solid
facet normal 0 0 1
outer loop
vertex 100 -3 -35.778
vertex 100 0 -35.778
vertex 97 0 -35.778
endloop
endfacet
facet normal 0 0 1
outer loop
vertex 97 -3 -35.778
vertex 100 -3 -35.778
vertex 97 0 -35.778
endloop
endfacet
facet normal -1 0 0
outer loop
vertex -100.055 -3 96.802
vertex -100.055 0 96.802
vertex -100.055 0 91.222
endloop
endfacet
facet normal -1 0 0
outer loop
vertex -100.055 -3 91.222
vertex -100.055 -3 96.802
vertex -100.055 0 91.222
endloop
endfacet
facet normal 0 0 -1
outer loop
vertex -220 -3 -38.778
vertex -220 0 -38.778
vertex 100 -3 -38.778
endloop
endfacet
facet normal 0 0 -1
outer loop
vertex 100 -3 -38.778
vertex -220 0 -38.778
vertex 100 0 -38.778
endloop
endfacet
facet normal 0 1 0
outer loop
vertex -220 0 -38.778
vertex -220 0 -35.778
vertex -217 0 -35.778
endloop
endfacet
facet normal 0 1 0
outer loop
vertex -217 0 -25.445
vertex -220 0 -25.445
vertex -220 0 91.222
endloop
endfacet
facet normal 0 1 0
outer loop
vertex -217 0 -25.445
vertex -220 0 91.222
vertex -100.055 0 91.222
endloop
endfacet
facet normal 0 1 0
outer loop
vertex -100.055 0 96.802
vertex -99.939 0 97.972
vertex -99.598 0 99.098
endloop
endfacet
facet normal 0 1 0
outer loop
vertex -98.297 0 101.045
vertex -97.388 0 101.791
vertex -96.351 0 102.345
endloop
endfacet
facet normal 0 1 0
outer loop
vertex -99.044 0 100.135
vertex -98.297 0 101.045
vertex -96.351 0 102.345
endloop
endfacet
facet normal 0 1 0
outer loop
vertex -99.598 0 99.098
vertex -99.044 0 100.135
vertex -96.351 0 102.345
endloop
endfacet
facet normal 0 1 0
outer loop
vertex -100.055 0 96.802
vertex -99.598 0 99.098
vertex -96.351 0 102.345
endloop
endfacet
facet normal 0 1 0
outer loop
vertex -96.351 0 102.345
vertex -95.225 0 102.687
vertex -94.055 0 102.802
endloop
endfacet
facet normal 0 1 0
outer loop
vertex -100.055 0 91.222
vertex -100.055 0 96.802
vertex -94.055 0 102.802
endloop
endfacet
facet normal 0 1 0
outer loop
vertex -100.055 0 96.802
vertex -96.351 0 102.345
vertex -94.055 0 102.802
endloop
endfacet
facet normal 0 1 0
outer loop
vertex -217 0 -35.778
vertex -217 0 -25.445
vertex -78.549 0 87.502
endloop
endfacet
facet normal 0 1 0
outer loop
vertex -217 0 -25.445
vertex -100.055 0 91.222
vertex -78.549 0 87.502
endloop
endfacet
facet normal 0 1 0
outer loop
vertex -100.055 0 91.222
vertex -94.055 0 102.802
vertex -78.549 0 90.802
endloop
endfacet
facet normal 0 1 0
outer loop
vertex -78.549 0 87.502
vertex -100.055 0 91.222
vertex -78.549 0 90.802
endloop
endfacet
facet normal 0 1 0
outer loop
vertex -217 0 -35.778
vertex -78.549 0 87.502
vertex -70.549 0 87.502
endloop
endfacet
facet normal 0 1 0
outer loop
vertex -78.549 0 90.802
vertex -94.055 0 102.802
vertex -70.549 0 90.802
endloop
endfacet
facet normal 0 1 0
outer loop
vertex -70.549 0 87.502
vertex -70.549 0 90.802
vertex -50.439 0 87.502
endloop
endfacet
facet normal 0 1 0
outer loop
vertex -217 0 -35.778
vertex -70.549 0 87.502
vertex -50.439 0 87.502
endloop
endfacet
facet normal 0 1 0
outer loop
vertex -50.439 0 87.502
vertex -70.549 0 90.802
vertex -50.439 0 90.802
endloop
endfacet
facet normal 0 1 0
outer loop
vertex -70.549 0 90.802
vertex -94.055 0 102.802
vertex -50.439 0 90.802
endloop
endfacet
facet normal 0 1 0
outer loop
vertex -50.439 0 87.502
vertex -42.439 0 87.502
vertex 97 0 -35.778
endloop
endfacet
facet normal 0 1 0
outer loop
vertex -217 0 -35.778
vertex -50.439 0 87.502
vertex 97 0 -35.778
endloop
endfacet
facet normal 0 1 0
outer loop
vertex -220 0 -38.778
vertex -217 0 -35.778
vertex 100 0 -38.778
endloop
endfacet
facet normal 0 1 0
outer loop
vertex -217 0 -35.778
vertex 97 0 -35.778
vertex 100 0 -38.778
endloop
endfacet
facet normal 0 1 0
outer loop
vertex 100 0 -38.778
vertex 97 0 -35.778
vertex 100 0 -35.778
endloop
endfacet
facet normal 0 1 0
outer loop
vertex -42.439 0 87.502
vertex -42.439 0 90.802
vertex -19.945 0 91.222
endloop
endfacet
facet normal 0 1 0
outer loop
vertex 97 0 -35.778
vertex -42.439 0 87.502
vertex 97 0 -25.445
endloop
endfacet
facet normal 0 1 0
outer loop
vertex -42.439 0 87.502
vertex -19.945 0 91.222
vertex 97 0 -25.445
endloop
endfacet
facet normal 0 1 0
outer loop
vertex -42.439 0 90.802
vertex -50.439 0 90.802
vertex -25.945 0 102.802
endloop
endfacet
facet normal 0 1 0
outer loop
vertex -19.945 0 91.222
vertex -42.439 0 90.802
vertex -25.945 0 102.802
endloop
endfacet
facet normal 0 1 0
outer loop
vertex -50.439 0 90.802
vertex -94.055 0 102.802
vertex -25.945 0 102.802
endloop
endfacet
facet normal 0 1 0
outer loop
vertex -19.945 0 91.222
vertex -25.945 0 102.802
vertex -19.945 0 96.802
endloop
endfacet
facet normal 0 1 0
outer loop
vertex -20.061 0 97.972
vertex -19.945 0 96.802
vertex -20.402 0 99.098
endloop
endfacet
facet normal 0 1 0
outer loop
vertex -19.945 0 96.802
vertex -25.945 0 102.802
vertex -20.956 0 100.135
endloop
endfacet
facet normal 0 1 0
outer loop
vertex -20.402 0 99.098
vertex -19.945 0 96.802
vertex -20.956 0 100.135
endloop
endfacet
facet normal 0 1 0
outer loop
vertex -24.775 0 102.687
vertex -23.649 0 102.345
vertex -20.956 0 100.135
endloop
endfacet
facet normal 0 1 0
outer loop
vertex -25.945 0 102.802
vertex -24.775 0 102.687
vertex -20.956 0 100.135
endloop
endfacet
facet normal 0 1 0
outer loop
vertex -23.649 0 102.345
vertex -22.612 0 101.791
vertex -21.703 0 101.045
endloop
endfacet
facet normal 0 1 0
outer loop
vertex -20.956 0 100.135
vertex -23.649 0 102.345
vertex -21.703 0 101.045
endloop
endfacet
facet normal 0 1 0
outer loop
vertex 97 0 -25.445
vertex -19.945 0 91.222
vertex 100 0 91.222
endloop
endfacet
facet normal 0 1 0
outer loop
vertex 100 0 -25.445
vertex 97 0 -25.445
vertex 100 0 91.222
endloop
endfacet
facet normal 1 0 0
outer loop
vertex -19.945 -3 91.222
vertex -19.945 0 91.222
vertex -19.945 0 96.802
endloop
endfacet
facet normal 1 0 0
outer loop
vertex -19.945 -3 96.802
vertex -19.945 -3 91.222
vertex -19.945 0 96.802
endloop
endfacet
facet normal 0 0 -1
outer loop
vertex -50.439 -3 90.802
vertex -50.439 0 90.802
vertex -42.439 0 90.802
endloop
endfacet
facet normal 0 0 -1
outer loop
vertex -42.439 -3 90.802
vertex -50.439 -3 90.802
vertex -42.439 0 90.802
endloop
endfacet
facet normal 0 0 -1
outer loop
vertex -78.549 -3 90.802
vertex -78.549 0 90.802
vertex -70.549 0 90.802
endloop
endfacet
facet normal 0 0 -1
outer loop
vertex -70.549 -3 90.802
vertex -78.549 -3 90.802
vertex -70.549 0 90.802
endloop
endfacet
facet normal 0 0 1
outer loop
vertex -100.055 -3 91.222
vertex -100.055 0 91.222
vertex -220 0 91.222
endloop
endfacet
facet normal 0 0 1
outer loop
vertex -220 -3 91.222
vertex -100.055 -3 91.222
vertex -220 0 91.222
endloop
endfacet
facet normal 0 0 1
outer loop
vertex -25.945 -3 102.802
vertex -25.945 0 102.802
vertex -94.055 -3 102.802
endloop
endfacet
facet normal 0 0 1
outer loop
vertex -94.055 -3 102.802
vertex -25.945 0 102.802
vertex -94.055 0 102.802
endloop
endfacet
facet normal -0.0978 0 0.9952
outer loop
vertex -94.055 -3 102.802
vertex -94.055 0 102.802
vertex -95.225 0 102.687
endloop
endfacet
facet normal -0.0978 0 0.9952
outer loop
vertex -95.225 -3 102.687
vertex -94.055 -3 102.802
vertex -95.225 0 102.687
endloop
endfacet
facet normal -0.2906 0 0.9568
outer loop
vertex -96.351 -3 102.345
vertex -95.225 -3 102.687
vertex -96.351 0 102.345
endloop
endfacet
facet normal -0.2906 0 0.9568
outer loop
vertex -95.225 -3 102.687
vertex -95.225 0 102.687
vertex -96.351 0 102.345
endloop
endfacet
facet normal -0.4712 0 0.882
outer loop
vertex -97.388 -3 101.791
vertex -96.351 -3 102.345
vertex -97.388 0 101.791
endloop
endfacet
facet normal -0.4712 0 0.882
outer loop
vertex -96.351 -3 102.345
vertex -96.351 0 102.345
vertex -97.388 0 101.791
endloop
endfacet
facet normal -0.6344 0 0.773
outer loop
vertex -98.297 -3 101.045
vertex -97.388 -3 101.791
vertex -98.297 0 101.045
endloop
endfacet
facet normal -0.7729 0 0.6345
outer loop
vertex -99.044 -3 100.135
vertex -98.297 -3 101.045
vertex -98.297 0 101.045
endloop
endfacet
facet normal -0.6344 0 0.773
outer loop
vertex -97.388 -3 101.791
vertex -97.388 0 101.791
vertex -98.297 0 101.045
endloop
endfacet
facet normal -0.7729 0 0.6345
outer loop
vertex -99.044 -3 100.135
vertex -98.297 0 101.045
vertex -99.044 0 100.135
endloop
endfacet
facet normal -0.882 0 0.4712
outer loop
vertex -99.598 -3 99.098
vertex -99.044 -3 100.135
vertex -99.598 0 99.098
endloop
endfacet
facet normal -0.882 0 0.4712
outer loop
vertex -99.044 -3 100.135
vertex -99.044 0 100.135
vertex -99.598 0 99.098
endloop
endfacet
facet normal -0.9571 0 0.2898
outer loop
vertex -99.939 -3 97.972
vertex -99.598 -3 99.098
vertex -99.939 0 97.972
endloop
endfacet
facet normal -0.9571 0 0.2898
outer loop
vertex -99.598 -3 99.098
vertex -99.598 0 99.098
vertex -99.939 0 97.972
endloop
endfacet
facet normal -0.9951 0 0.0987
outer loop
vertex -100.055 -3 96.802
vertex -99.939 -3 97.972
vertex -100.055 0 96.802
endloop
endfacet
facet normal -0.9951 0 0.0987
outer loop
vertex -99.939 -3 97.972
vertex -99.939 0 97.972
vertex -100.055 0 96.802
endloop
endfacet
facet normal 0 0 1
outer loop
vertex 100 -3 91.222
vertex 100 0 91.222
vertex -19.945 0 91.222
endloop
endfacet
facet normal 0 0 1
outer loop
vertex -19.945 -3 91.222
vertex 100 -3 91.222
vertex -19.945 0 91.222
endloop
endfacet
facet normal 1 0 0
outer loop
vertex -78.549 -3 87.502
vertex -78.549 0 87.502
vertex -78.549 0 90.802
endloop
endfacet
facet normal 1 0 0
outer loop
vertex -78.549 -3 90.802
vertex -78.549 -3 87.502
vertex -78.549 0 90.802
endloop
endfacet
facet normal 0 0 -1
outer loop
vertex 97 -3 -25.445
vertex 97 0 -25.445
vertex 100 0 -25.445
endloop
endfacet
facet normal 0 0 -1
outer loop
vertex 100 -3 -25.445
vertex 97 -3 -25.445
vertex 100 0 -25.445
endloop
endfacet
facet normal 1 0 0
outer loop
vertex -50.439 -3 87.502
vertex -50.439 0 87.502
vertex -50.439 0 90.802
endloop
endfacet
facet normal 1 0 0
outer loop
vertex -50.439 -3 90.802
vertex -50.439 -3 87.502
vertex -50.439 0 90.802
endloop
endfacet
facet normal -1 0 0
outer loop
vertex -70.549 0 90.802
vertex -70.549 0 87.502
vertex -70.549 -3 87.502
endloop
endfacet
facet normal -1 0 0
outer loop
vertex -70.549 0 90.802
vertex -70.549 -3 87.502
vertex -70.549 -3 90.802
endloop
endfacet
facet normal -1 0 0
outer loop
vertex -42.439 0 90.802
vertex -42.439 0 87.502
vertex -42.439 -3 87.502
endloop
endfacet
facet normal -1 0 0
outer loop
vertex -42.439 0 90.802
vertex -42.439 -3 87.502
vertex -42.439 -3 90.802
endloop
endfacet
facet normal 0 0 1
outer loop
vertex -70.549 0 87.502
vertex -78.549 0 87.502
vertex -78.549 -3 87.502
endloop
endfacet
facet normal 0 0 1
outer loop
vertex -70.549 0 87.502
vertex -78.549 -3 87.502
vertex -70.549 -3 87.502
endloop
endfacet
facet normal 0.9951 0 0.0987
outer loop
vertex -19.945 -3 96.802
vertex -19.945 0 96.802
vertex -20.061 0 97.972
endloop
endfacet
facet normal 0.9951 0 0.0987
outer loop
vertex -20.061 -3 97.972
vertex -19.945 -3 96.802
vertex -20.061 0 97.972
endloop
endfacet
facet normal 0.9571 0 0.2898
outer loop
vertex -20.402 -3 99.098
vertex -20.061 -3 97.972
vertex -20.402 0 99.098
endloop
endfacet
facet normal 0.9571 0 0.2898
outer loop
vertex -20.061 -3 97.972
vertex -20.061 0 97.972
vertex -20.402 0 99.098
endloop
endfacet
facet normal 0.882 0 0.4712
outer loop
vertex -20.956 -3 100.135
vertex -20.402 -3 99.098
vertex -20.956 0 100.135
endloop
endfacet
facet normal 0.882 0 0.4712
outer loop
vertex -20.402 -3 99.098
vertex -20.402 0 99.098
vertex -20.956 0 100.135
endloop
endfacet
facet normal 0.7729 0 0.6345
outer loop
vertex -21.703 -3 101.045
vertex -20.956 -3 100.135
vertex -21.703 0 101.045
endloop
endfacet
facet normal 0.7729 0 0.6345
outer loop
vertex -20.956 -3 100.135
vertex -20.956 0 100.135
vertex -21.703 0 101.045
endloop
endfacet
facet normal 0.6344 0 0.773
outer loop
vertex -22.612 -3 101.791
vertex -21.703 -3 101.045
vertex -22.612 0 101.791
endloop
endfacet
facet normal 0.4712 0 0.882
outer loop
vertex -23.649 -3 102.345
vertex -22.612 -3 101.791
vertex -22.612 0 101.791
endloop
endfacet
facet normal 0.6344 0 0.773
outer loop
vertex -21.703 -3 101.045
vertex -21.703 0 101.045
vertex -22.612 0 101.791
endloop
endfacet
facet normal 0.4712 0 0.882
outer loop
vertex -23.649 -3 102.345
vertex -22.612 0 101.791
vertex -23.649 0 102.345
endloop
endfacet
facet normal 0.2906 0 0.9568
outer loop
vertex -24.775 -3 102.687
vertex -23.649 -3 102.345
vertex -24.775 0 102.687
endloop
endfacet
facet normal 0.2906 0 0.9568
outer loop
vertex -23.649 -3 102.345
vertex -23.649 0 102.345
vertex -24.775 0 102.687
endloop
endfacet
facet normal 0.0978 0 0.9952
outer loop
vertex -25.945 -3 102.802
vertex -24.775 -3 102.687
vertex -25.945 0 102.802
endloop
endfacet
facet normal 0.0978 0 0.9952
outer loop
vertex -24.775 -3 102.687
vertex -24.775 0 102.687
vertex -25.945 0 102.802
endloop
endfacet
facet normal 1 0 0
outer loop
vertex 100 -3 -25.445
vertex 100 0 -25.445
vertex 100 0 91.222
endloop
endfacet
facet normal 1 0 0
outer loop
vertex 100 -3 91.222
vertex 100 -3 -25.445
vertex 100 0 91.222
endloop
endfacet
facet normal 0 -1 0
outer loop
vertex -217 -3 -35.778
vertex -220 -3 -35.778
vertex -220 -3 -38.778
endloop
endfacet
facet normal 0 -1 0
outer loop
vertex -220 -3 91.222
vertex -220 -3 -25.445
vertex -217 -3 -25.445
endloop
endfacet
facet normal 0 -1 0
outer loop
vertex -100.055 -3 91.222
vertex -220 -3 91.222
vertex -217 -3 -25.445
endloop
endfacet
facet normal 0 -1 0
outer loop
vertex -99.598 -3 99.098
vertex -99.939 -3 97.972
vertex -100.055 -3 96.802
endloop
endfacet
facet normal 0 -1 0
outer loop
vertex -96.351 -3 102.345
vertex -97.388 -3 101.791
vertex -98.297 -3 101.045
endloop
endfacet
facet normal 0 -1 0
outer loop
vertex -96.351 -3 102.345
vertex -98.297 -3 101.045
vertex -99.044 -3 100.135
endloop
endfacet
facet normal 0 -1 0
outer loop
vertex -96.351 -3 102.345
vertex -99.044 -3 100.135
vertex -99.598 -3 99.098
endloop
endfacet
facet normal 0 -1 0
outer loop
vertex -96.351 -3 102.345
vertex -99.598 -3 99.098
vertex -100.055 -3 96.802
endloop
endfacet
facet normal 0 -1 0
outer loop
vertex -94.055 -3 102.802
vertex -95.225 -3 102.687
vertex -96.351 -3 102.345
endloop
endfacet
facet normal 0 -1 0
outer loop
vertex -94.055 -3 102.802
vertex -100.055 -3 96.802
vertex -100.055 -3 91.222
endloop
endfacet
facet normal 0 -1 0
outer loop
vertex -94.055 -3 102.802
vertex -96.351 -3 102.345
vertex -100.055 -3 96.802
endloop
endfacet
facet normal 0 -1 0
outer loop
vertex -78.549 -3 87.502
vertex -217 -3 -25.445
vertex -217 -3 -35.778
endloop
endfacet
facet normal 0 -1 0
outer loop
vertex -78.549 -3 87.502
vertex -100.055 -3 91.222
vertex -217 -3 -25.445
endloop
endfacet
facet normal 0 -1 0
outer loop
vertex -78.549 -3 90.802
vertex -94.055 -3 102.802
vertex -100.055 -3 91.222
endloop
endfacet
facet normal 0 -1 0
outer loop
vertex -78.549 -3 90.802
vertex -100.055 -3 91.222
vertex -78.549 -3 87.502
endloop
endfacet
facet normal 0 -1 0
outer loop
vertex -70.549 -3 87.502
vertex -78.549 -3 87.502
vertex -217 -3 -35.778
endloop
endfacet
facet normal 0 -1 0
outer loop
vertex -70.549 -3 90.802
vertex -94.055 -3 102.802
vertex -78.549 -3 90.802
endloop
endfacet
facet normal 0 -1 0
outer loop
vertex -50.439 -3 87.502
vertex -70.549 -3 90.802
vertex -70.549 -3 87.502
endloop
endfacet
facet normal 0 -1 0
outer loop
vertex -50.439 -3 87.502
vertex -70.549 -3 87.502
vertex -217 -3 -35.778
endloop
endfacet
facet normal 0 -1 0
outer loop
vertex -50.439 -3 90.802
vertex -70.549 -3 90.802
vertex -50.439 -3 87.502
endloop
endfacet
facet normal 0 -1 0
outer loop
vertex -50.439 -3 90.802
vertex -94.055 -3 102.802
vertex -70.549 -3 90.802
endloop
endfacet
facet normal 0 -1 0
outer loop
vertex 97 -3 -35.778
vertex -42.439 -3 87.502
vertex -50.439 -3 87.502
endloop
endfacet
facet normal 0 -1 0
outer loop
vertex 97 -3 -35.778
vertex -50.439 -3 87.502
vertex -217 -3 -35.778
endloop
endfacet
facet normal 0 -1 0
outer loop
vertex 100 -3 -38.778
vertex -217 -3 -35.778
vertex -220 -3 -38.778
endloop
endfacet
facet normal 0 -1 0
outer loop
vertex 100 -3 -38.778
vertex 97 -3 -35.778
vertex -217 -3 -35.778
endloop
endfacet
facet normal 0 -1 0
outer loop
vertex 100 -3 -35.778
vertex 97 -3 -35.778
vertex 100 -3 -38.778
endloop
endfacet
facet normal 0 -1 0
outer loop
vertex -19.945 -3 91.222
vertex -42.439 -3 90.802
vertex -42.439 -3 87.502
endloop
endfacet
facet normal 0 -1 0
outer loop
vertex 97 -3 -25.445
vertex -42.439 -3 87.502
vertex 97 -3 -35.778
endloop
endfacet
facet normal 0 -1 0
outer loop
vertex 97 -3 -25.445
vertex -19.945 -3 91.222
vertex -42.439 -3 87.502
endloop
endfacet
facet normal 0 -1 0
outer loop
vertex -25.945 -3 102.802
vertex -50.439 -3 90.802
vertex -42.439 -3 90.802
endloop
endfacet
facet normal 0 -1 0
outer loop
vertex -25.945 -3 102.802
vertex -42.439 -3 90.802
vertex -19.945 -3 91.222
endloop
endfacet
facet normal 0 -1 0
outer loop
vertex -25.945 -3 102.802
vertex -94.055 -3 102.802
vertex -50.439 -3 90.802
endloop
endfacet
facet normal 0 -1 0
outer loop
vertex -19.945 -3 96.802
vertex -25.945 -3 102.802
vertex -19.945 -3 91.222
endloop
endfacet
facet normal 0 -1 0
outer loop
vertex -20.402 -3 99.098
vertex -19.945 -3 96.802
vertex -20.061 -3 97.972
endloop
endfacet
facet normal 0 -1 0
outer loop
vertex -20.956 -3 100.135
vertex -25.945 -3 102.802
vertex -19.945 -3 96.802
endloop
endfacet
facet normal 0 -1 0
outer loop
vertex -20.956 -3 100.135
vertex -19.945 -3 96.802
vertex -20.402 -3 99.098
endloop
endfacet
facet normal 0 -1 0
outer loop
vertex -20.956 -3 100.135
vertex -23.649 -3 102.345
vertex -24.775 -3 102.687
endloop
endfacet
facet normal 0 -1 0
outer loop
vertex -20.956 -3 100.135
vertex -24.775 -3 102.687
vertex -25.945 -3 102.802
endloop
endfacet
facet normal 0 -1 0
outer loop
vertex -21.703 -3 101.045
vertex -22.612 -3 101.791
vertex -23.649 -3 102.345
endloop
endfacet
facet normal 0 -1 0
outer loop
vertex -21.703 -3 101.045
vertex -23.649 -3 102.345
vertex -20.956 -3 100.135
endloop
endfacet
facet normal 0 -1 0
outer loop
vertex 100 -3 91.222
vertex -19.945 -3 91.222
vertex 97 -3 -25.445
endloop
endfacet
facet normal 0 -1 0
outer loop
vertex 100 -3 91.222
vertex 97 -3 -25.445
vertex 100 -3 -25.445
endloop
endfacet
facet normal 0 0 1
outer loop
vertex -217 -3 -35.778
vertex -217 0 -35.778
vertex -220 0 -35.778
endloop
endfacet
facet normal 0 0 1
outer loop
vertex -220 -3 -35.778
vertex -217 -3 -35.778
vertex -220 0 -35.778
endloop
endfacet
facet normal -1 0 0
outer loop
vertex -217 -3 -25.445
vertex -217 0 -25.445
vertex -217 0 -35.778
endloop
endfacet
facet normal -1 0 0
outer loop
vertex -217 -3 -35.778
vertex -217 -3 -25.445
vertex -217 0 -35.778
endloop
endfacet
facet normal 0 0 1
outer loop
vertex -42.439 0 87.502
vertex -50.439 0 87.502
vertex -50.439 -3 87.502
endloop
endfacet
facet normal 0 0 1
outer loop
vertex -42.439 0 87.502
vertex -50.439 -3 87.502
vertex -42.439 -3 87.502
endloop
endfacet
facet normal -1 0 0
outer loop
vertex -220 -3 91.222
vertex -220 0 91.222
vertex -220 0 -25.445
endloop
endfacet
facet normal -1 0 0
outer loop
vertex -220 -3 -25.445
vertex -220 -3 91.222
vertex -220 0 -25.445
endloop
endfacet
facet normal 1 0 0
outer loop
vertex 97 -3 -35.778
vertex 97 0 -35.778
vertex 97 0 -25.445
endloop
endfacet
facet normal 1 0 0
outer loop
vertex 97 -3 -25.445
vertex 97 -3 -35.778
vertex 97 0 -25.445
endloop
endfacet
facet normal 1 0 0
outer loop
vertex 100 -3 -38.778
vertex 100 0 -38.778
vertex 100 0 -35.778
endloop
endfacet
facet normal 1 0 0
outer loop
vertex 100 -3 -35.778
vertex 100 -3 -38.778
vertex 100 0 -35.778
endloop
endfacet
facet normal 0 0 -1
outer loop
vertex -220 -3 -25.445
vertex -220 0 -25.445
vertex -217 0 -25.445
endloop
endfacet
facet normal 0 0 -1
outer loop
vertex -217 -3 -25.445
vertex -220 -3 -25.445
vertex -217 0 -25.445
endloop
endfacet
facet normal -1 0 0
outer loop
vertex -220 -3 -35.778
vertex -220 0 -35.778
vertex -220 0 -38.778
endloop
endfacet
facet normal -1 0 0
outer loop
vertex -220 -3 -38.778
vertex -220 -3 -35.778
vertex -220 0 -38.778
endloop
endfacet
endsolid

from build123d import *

# Parameters (mm, degrees)
F0_W     = 8
F0_H     = 3.3
F1_DEPTH = 3


with BuildPart() as f1:
    # F0 (on Front) → F1 (new body)
    with BuildSketch(Plane.XZ):
        with BuildLine():
            Line((-220, -35.777669), (-220, -38.777669))
            Line((-220, -38.777669), (100, -38.777669))
            Line((100, -38.777669), (100, -35.777669))
            Line((100, -35.777669), (97, -35.777669))
            Line((97, -35.777669), (97, -25.444639))
            Line((97, -25.444639), (100, -25.444669))
            Line((100, -25.444669), (100, 91.222331))
            Line((100, 91.222331), (-19.945289, 91.222331))
            Line((-19.945289, 91.222331), (-19.945289, 96.801867))
            ThreePointArc((-19.945289, 96.801867), (-21.702648, 101.044508), (-25.945289, 102.801867))
            Line((-25.945289, 102.801867), (-94.054711, 102.801867))
            ThreePointArc((-94.054711, 102.801867), (-98.297352, 101.044508), (-100.054711, 96.801867))
            Line((-100.054711, 96.801867), (-100.054711, 91.222331))
            Line((-100.054711, 91.222331), (-220, 91.222331))
            Line((-220, 91.222331), (-220, -25.444669))
            Line((-220, -25.444669), (-217, -25.444669))
            Line((-217, -25.444669), (-217, -35.777669))
            Line((-217, -35.777669), (-220, -35.777669))
        make_face()
        with Locations((-74.548644, 89.151867)):
            Rectangle(F0_W, F0_H, mode=Mode.SUBTRACT)
        with Locations((-46.439216, 89.151867)):
            Rectangle(F0_W, F0_H, mode=Mode.SUBTRACT)
    extrude(amount=F1_DEPTH)


solid = f1.part
